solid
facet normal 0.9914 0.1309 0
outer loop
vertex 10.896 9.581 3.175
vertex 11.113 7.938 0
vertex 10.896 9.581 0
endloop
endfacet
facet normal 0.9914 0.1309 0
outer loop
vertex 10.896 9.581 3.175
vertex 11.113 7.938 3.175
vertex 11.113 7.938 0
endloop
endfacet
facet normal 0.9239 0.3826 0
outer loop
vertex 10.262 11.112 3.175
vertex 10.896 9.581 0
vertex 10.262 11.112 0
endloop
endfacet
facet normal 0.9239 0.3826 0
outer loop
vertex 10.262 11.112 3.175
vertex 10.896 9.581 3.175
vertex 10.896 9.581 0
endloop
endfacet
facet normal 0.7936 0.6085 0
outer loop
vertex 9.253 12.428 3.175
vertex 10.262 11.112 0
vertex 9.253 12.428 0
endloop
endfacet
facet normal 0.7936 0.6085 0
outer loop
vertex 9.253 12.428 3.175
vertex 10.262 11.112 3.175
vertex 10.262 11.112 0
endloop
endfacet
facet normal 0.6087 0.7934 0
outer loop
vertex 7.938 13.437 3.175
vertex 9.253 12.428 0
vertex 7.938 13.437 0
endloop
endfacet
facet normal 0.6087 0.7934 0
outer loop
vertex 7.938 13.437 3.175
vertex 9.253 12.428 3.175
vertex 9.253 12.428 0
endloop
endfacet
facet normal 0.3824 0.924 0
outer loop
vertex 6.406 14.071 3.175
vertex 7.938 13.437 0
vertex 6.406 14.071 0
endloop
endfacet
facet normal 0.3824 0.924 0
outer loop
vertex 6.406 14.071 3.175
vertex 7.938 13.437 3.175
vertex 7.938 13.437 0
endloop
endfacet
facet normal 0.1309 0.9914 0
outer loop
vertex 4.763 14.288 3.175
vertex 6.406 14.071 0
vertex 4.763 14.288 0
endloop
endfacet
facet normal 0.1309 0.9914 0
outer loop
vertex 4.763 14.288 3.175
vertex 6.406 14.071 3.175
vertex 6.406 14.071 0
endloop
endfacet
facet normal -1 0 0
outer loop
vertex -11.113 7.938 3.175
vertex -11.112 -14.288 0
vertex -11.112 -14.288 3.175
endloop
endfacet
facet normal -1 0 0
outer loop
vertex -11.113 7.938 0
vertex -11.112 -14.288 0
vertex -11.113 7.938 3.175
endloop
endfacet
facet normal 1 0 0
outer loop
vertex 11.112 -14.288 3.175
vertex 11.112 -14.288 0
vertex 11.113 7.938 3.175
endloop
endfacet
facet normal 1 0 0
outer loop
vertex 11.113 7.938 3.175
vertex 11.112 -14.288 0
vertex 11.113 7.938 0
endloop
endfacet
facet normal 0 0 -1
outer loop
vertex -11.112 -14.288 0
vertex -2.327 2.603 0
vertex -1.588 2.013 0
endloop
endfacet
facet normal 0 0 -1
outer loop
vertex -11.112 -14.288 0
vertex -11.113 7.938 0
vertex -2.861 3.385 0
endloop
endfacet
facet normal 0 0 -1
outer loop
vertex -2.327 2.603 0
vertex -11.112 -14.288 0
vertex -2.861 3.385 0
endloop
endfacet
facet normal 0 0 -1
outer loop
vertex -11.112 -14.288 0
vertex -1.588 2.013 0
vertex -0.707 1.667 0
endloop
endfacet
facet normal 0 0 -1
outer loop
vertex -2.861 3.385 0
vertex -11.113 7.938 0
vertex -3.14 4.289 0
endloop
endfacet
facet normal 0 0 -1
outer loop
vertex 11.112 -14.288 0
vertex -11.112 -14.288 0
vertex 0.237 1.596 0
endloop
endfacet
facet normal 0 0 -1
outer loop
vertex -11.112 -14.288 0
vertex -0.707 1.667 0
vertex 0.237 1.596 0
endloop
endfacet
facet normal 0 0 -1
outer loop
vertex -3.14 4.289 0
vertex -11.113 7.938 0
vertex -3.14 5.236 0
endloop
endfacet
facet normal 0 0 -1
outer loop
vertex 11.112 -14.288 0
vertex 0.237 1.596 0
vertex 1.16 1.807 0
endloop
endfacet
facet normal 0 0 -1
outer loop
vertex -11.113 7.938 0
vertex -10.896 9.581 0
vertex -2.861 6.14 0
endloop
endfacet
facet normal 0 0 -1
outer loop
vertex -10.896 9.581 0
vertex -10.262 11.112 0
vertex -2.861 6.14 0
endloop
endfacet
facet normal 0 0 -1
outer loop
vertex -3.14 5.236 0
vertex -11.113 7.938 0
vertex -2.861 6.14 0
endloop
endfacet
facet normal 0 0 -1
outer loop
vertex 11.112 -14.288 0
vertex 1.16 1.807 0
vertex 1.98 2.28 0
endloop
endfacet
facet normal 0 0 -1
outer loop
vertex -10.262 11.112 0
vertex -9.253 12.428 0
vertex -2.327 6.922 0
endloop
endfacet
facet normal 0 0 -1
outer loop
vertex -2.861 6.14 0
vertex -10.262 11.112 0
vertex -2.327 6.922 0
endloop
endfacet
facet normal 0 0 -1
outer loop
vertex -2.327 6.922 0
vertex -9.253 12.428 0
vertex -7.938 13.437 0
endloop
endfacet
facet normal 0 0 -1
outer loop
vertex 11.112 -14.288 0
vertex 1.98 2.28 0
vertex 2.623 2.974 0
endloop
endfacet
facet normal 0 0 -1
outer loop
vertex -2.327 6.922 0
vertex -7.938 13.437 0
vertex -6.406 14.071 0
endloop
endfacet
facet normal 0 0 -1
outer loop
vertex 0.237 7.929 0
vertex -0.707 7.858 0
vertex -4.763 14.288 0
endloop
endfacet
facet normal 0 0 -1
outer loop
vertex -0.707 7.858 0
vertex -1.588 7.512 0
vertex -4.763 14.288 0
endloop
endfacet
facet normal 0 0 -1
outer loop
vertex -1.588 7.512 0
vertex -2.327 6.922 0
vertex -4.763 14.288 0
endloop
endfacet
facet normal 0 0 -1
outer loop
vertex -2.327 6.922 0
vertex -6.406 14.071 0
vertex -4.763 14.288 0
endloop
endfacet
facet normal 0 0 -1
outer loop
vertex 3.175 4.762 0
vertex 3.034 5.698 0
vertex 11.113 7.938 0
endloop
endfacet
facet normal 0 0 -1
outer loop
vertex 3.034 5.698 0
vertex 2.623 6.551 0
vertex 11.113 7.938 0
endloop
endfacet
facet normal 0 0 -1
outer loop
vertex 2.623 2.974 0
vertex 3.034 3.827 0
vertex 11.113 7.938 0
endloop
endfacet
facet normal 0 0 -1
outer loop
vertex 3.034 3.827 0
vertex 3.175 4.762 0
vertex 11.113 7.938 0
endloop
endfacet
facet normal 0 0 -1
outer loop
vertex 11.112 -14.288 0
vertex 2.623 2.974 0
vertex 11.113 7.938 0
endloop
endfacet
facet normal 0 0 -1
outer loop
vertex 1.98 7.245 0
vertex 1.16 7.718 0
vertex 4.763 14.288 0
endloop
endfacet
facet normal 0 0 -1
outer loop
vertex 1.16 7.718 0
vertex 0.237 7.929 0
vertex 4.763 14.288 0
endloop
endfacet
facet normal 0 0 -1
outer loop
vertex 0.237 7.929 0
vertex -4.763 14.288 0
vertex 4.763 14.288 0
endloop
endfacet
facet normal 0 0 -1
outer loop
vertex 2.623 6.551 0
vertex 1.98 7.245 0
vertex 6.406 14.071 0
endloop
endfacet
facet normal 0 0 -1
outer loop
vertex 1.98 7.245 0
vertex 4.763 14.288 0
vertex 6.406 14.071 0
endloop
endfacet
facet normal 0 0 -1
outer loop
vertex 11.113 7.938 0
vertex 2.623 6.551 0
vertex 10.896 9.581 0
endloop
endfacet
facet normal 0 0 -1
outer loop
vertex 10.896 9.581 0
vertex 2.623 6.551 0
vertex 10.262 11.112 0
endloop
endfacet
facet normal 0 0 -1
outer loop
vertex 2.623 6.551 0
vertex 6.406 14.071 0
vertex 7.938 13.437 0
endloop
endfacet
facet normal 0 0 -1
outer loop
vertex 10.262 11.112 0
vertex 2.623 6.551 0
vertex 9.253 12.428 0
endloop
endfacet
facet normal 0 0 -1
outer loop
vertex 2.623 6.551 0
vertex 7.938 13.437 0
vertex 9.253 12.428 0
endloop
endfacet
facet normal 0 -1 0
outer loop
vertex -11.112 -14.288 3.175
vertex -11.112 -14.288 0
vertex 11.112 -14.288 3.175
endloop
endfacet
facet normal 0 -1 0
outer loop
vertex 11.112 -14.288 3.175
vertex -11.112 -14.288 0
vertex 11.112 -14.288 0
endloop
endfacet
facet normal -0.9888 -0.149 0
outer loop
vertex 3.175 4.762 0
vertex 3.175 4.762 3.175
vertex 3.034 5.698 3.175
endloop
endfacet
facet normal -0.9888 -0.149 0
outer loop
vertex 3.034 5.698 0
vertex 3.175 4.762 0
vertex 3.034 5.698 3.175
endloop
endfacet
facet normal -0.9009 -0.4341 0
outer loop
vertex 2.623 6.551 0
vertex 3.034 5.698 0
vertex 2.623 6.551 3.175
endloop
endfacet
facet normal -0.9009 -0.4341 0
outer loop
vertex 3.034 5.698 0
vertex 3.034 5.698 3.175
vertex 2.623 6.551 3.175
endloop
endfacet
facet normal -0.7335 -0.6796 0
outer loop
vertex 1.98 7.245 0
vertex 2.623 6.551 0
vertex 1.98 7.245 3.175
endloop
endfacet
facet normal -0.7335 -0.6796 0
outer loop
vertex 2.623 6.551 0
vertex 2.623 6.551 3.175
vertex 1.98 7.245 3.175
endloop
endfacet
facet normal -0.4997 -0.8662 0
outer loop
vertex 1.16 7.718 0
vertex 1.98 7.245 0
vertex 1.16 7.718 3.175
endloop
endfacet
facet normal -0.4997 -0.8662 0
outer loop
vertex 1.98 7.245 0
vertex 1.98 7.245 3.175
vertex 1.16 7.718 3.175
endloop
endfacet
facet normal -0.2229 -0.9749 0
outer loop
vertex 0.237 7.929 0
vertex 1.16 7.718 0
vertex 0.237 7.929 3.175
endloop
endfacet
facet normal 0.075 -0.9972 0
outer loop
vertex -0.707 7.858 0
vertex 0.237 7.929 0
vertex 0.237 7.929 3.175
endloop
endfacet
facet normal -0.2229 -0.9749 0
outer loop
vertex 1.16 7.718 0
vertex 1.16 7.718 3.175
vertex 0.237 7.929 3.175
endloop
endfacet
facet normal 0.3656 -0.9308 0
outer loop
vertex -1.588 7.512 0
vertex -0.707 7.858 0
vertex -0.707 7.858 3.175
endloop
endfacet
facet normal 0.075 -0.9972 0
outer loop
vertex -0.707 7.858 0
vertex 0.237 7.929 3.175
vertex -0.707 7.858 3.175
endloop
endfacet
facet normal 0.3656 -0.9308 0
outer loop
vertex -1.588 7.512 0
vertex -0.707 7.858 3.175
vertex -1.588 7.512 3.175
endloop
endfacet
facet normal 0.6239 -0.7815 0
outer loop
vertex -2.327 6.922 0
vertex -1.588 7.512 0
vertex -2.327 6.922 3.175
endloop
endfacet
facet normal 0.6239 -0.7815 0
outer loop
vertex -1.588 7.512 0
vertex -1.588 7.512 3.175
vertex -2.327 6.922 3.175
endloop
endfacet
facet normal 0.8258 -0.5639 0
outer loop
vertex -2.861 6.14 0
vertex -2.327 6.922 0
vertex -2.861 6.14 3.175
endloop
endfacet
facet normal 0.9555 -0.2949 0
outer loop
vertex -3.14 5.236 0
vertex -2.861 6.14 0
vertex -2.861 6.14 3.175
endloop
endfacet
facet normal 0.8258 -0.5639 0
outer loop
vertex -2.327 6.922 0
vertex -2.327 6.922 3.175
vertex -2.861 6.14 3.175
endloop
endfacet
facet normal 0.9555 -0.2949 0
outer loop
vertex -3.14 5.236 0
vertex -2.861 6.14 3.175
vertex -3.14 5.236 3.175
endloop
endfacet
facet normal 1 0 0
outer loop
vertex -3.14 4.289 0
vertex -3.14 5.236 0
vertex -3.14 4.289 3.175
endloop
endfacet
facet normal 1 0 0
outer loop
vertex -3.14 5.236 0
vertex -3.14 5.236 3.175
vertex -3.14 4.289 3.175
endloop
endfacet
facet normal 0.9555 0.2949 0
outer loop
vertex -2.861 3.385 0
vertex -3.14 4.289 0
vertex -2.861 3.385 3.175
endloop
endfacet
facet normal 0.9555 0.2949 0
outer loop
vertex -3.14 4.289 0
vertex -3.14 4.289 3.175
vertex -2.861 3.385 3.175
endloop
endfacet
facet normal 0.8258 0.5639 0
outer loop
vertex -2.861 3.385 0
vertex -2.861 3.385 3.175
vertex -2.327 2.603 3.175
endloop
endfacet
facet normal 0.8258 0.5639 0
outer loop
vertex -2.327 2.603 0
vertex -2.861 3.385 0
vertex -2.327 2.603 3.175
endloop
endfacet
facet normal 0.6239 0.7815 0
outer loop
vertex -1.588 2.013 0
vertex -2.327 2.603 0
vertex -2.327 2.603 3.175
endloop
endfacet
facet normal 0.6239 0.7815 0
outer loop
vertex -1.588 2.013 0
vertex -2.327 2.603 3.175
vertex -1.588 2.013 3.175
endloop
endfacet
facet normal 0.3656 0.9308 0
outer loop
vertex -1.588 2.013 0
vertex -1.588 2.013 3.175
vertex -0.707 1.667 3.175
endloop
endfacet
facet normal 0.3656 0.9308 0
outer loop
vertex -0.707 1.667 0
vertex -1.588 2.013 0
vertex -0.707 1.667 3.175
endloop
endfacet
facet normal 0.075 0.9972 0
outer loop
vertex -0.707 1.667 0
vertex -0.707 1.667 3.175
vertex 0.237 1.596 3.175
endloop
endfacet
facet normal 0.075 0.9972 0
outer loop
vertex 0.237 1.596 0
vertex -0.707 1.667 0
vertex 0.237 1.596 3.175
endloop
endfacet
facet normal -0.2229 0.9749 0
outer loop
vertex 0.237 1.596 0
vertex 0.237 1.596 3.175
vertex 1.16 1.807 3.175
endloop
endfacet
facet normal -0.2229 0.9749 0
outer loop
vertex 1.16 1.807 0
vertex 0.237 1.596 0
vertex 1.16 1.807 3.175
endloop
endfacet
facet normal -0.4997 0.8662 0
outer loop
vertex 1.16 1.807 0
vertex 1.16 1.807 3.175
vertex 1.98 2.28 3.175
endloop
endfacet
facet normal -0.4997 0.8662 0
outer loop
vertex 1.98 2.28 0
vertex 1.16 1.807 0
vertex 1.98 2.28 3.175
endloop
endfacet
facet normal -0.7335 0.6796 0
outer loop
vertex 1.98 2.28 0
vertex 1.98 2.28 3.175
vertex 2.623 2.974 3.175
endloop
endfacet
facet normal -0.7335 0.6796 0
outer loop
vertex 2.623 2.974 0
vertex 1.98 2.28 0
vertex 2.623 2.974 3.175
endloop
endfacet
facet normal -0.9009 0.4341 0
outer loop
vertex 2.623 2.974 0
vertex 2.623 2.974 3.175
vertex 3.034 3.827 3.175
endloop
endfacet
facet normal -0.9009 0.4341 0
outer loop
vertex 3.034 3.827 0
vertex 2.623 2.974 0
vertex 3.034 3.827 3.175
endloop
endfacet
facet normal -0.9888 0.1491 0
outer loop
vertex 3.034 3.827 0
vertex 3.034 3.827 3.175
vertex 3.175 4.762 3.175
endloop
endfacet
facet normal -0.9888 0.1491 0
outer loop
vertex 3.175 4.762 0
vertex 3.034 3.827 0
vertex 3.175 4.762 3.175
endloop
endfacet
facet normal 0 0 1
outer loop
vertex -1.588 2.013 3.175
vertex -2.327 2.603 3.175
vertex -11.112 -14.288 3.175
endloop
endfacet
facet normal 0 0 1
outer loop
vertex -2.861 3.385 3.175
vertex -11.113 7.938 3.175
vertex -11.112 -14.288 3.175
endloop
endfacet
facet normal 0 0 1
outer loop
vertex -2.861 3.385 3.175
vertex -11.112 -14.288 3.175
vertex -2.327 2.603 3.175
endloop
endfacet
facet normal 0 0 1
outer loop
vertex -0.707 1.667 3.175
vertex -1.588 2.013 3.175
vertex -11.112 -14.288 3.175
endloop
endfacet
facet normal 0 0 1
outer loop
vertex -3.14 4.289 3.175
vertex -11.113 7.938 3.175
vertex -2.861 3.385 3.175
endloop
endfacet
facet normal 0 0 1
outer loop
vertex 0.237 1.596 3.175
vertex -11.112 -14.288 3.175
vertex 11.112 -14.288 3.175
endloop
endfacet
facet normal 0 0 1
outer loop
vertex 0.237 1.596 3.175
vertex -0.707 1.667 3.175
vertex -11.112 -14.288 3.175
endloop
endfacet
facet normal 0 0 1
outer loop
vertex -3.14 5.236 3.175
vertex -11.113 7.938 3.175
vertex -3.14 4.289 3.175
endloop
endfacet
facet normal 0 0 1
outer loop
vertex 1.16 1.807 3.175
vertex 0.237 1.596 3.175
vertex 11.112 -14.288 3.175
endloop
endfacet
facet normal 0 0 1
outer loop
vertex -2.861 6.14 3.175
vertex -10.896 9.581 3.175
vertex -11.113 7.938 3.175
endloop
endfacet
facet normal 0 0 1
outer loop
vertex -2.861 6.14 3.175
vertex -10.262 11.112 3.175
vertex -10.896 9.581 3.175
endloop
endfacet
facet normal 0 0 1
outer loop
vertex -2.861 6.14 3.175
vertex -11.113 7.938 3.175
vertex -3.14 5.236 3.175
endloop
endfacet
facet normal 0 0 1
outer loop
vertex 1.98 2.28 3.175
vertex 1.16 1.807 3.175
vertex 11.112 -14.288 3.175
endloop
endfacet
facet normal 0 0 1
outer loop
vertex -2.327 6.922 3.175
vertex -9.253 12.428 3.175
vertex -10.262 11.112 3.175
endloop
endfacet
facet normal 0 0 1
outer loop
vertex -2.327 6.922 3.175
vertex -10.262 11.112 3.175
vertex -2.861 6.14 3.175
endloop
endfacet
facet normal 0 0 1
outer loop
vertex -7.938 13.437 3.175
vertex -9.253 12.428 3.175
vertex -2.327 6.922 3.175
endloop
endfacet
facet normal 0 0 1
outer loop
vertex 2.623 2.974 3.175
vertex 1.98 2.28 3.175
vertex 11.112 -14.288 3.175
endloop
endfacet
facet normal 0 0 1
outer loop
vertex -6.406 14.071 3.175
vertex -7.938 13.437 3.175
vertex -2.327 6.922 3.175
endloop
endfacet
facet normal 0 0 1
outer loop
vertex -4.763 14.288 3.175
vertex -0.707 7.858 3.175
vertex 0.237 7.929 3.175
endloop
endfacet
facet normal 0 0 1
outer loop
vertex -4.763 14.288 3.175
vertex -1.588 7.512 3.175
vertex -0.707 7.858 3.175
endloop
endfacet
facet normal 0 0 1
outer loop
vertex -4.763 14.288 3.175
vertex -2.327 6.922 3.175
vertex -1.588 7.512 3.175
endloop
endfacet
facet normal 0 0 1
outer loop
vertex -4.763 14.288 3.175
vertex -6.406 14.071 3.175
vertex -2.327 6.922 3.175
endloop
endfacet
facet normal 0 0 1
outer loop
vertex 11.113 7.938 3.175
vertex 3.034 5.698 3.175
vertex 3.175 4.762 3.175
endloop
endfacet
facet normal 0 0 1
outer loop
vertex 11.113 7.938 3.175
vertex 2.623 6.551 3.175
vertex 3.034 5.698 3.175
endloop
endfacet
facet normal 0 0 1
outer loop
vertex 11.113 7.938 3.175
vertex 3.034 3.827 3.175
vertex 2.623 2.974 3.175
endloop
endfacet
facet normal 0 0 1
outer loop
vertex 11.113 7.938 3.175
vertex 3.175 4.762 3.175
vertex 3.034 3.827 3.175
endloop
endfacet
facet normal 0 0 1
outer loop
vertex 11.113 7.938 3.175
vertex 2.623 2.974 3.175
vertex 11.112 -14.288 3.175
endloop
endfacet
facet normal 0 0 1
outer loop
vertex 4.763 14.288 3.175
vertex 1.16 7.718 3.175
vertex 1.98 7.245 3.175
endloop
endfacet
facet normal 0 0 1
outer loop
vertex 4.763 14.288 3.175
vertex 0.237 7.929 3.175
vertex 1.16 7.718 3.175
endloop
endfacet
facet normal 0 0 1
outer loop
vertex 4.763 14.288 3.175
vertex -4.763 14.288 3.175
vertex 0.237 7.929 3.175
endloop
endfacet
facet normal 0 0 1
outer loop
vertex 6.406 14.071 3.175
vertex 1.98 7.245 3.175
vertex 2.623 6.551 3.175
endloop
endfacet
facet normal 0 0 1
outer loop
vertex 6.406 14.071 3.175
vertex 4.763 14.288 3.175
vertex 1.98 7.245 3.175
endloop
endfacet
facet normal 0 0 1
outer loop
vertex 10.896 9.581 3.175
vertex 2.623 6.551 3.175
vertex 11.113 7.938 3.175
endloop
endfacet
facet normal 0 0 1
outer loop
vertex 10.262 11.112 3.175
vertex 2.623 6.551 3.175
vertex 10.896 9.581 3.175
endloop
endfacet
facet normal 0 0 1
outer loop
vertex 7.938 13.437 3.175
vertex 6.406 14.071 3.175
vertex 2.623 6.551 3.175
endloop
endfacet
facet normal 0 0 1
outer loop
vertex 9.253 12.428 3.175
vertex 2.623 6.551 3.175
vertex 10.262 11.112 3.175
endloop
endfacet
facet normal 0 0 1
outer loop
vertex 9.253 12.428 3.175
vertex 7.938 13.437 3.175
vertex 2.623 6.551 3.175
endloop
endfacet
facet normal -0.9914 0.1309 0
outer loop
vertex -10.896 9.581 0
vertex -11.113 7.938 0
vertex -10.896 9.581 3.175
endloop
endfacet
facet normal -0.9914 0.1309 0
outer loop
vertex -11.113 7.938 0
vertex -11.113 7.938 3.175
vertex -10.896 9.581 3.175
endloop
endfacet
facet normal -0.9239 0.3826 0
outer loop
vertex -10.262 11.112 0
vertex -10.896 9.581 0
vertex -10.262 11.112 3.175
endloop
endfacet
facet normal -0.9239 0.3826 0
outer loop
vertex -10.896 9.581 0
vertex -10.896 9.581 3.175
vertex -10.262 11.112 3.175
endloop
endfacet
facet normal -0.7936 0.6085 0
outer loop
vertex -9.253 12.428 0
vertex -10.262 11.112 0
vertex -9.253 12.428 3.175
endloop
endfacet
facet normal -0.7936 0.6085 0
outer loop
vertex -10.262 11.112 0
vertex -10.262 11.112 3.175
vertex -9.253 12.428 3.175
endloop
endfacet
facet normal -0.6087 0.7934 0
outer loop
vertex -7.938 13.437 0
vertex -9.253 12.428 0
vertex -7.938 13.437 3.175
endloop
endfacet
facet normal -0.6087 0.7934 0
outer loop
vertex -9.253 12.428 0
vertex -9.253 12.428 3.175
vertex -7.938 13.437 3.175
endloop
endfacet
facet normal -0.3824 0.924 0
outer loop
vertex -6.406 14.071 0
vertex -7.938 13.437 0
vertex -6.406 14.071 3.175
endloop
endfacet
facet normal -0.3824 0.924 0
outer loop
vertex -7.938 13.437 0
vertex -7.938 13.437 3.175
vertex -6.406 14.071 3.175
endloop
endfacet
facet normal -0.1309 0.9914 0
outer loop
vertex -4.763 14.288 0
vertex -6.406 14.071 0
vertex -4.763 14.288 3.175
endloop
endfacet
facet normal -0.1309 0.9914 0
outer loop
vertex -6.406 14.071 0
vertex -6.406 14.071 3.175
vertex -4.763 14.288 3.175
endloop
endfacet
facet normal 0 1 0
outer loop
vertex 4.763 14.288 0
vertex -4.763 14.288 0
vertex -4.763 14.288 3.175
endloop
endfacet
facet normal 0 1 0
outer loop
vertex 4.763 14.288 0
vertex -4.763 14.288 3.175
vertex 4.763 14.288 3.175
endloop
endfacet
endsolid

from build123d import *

# Parameters (mm, degrees)
SKETCH1_W           = 22.225
SKETCH1_H           = 28.575
BOSS_EXTRUDE1_DEPTH = 3.175
FILLET1_R           = 6.35
SKETCH2_R           = 3.175
CUT_EXTRUDE1_DEPTH  = 19.376641083


with BuildPart() as part:
    # Sketch1 → Boss-Extrude1 (new body)
    with BuildSketch(Plane.XY):
        Rectangle(SKETCH1_W, SKETCH1_H)
    extrude(amount=BOSS_EXTRUDE1_DEPTH)

    # Fillet1
    fillet1_edges = [part.edges().sort_by_distance(p)[0] for p in [
        (-11.1125, 14.2875, 1.5875),
        (11.1125, 14.2875, 1.5875),
    ]]
    fillet(fillet1_edges, radius=FILLET1_R)

    # Sketch2 → Cut-Extrude1 (cut, through all)
    with BuildSketch(Plane.XY.offset(3.175)):
        with Locations((0, 4.7625)):
            Circle(SKETCH2_R)
    extrude(amount=-CUT_EXTRUDE1_DEPTH, mode=Mode.SUBTRACT)


solid = part.part
